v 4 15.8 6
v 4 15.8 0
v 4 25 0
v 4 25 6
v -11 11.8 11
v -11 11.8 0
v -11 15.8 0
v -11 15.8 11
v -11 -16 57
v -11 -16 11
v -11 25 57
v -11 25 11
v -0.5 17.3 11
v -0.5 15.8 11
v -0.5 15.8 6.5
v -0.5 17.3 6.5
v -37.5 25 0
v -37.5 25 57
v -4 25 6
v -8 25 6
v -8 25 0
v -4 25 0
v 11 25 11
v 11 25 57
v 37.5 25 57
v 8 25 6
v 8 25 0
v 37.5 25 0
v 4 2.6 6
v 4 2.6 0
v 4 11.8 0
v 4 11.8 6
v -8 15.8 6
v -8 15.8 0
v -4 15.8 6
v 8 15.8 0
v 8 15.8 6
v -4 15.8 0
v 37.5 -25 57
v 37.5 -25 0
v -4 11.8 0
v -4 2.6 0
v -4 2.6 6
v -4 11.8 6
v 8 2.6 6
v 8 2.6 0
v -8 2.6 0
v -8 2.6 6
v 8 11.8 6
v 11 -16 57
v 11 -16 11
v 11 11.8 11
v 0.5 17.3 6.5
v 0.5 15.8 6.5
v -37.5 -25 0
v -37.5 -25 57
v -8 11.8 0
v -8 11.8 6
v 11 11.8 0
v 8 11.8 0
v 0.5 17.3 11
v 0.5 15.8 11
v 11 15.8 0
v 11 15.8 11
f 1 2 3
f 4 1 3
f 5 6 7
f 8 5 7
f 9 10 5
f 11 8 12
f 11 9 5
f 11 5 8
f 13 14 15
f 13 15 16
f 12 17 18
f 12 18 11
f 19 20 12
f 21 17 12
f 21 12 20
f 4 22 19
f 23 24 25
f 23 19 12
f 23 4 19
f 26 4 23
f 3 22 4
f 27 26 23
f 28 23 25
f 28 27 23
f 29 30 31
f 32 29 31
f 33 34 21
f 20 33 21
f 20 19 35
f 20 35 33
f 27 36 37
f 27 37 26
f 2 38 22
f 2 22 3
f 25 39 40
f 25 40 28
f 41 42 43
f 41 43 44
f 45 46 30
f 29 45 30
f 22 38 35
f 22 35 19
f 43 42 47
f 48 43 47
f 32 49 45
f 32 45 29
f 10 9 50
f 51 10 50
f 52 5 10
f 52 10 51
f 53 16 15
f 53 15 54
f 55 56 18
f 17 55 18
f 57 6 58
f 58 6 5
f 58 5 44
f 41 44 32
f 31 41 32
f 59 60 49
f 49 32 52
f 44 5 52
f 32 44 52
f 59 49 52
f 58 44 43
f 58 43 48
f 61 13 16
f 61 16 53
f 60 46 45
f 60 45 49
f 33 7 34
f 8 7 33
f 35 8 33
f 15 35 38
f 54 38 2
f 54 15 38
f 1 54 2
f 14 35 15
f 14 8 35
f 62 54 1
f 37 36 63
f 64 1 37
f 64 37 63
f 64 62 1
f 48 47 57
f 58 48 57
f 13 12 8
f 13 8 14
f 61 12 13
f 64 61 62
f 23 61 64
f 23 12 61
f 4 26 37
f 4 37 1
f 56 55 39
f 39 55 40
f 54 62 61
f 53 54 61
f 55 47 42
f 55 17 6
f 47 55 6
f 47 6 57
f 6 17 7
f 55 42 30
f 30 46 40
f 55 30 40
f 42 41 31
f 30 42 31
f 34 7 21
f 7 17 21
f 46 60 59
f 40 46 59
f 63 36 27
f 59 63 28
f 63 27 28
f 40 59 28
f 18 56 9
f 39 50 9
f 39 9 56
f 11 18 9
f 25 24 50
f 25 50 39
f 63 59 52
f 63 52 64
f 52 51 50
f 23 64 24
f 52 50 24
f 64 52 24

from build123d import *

# Parameters (mm, degrees)
SKETCH1_W           = 75
SKETCH1_H           = 50
BOSS_EXTRUDE1_DEPTH = 57
SKETCH2_W           = 22
SKETCH2_H           = 41
CUT_EXTRUDE1_DEPTH  = 46
SKETCH4_W           = 22
SKETCH4_H           = 4
CUT_EXTRUDE2_DEPTH  = 65.399145957
SKETCH5_W           = 4
SKETCH5_H           = 22.4
CUT_EXTRUDE3_DEPTH  = 6
SKETCH6_W           = 1
SKETCH6_H           = 1.5
CUT_EXTRUDE4_DEPTH  = 4.5


with BuildPart() as part:
    # Sketch1 → Boss-Extrude1 (new body)
    with BuildSketch(Plane.XY):
        Rectangle(SKETCH1_W, SKETCH1_H)
    extrude(amount=BOSS_EXTRUDE1_DEPTH)

    # Sketch2 → Cut-Extrude1 (cut)
    with BuildSketch(Plane.XY.offset(57)):
        with Locations((0, 4.5)):
            Rectangle(SKETCH2_W, SKETCH2_H)
    extrude(amount=-CUT_EXTRUDE1_DEPTH, mode=Mode.SUBTRACT)

    # Sketch4 → Cut-Extrude2 (cut, through all)
    with BuildSketch(Plane.XY.offset(11)):
        with Locations((0, 13.8)):
            Rectangle(SKETCH4_W, SKETCH4_H)
    extrude(amount=-CUT_EXTRUDE2_DEPTH, mode=Mode.SUBTRACT)

    # Sketch5 → Cut-Extrude3 (cut)
    with BuildSketch(Plane(origin=(0, 0, 0), x_dir=(-1, 0, 0), z_dir=(0, 0, -1))):
        with Locations((-6, 13.8)):
            Rectangle(SKETCH5_W, SKETCH5_H)
        with Locations((6, 13.8)):
            Rectangle(SKETCH5_W, SKETCH5_H)
    extrude(amount=-CUT_EXTRUDE3_DEPTH, mode=Mode.SUBTRACT)

    # Sketch6 → Cut-Extrude4 (cut)
    with BuildSketch(Plane.XY.offset(11)):
        with Locations((0, 16.55)):
            Rectangle(SKETCH6_W, SKETCH6_H)
    extrude(amount=-CUT_EXTRUDE4_DEPTH, mode=Mode.SUBTRACT)


solid = part.part
